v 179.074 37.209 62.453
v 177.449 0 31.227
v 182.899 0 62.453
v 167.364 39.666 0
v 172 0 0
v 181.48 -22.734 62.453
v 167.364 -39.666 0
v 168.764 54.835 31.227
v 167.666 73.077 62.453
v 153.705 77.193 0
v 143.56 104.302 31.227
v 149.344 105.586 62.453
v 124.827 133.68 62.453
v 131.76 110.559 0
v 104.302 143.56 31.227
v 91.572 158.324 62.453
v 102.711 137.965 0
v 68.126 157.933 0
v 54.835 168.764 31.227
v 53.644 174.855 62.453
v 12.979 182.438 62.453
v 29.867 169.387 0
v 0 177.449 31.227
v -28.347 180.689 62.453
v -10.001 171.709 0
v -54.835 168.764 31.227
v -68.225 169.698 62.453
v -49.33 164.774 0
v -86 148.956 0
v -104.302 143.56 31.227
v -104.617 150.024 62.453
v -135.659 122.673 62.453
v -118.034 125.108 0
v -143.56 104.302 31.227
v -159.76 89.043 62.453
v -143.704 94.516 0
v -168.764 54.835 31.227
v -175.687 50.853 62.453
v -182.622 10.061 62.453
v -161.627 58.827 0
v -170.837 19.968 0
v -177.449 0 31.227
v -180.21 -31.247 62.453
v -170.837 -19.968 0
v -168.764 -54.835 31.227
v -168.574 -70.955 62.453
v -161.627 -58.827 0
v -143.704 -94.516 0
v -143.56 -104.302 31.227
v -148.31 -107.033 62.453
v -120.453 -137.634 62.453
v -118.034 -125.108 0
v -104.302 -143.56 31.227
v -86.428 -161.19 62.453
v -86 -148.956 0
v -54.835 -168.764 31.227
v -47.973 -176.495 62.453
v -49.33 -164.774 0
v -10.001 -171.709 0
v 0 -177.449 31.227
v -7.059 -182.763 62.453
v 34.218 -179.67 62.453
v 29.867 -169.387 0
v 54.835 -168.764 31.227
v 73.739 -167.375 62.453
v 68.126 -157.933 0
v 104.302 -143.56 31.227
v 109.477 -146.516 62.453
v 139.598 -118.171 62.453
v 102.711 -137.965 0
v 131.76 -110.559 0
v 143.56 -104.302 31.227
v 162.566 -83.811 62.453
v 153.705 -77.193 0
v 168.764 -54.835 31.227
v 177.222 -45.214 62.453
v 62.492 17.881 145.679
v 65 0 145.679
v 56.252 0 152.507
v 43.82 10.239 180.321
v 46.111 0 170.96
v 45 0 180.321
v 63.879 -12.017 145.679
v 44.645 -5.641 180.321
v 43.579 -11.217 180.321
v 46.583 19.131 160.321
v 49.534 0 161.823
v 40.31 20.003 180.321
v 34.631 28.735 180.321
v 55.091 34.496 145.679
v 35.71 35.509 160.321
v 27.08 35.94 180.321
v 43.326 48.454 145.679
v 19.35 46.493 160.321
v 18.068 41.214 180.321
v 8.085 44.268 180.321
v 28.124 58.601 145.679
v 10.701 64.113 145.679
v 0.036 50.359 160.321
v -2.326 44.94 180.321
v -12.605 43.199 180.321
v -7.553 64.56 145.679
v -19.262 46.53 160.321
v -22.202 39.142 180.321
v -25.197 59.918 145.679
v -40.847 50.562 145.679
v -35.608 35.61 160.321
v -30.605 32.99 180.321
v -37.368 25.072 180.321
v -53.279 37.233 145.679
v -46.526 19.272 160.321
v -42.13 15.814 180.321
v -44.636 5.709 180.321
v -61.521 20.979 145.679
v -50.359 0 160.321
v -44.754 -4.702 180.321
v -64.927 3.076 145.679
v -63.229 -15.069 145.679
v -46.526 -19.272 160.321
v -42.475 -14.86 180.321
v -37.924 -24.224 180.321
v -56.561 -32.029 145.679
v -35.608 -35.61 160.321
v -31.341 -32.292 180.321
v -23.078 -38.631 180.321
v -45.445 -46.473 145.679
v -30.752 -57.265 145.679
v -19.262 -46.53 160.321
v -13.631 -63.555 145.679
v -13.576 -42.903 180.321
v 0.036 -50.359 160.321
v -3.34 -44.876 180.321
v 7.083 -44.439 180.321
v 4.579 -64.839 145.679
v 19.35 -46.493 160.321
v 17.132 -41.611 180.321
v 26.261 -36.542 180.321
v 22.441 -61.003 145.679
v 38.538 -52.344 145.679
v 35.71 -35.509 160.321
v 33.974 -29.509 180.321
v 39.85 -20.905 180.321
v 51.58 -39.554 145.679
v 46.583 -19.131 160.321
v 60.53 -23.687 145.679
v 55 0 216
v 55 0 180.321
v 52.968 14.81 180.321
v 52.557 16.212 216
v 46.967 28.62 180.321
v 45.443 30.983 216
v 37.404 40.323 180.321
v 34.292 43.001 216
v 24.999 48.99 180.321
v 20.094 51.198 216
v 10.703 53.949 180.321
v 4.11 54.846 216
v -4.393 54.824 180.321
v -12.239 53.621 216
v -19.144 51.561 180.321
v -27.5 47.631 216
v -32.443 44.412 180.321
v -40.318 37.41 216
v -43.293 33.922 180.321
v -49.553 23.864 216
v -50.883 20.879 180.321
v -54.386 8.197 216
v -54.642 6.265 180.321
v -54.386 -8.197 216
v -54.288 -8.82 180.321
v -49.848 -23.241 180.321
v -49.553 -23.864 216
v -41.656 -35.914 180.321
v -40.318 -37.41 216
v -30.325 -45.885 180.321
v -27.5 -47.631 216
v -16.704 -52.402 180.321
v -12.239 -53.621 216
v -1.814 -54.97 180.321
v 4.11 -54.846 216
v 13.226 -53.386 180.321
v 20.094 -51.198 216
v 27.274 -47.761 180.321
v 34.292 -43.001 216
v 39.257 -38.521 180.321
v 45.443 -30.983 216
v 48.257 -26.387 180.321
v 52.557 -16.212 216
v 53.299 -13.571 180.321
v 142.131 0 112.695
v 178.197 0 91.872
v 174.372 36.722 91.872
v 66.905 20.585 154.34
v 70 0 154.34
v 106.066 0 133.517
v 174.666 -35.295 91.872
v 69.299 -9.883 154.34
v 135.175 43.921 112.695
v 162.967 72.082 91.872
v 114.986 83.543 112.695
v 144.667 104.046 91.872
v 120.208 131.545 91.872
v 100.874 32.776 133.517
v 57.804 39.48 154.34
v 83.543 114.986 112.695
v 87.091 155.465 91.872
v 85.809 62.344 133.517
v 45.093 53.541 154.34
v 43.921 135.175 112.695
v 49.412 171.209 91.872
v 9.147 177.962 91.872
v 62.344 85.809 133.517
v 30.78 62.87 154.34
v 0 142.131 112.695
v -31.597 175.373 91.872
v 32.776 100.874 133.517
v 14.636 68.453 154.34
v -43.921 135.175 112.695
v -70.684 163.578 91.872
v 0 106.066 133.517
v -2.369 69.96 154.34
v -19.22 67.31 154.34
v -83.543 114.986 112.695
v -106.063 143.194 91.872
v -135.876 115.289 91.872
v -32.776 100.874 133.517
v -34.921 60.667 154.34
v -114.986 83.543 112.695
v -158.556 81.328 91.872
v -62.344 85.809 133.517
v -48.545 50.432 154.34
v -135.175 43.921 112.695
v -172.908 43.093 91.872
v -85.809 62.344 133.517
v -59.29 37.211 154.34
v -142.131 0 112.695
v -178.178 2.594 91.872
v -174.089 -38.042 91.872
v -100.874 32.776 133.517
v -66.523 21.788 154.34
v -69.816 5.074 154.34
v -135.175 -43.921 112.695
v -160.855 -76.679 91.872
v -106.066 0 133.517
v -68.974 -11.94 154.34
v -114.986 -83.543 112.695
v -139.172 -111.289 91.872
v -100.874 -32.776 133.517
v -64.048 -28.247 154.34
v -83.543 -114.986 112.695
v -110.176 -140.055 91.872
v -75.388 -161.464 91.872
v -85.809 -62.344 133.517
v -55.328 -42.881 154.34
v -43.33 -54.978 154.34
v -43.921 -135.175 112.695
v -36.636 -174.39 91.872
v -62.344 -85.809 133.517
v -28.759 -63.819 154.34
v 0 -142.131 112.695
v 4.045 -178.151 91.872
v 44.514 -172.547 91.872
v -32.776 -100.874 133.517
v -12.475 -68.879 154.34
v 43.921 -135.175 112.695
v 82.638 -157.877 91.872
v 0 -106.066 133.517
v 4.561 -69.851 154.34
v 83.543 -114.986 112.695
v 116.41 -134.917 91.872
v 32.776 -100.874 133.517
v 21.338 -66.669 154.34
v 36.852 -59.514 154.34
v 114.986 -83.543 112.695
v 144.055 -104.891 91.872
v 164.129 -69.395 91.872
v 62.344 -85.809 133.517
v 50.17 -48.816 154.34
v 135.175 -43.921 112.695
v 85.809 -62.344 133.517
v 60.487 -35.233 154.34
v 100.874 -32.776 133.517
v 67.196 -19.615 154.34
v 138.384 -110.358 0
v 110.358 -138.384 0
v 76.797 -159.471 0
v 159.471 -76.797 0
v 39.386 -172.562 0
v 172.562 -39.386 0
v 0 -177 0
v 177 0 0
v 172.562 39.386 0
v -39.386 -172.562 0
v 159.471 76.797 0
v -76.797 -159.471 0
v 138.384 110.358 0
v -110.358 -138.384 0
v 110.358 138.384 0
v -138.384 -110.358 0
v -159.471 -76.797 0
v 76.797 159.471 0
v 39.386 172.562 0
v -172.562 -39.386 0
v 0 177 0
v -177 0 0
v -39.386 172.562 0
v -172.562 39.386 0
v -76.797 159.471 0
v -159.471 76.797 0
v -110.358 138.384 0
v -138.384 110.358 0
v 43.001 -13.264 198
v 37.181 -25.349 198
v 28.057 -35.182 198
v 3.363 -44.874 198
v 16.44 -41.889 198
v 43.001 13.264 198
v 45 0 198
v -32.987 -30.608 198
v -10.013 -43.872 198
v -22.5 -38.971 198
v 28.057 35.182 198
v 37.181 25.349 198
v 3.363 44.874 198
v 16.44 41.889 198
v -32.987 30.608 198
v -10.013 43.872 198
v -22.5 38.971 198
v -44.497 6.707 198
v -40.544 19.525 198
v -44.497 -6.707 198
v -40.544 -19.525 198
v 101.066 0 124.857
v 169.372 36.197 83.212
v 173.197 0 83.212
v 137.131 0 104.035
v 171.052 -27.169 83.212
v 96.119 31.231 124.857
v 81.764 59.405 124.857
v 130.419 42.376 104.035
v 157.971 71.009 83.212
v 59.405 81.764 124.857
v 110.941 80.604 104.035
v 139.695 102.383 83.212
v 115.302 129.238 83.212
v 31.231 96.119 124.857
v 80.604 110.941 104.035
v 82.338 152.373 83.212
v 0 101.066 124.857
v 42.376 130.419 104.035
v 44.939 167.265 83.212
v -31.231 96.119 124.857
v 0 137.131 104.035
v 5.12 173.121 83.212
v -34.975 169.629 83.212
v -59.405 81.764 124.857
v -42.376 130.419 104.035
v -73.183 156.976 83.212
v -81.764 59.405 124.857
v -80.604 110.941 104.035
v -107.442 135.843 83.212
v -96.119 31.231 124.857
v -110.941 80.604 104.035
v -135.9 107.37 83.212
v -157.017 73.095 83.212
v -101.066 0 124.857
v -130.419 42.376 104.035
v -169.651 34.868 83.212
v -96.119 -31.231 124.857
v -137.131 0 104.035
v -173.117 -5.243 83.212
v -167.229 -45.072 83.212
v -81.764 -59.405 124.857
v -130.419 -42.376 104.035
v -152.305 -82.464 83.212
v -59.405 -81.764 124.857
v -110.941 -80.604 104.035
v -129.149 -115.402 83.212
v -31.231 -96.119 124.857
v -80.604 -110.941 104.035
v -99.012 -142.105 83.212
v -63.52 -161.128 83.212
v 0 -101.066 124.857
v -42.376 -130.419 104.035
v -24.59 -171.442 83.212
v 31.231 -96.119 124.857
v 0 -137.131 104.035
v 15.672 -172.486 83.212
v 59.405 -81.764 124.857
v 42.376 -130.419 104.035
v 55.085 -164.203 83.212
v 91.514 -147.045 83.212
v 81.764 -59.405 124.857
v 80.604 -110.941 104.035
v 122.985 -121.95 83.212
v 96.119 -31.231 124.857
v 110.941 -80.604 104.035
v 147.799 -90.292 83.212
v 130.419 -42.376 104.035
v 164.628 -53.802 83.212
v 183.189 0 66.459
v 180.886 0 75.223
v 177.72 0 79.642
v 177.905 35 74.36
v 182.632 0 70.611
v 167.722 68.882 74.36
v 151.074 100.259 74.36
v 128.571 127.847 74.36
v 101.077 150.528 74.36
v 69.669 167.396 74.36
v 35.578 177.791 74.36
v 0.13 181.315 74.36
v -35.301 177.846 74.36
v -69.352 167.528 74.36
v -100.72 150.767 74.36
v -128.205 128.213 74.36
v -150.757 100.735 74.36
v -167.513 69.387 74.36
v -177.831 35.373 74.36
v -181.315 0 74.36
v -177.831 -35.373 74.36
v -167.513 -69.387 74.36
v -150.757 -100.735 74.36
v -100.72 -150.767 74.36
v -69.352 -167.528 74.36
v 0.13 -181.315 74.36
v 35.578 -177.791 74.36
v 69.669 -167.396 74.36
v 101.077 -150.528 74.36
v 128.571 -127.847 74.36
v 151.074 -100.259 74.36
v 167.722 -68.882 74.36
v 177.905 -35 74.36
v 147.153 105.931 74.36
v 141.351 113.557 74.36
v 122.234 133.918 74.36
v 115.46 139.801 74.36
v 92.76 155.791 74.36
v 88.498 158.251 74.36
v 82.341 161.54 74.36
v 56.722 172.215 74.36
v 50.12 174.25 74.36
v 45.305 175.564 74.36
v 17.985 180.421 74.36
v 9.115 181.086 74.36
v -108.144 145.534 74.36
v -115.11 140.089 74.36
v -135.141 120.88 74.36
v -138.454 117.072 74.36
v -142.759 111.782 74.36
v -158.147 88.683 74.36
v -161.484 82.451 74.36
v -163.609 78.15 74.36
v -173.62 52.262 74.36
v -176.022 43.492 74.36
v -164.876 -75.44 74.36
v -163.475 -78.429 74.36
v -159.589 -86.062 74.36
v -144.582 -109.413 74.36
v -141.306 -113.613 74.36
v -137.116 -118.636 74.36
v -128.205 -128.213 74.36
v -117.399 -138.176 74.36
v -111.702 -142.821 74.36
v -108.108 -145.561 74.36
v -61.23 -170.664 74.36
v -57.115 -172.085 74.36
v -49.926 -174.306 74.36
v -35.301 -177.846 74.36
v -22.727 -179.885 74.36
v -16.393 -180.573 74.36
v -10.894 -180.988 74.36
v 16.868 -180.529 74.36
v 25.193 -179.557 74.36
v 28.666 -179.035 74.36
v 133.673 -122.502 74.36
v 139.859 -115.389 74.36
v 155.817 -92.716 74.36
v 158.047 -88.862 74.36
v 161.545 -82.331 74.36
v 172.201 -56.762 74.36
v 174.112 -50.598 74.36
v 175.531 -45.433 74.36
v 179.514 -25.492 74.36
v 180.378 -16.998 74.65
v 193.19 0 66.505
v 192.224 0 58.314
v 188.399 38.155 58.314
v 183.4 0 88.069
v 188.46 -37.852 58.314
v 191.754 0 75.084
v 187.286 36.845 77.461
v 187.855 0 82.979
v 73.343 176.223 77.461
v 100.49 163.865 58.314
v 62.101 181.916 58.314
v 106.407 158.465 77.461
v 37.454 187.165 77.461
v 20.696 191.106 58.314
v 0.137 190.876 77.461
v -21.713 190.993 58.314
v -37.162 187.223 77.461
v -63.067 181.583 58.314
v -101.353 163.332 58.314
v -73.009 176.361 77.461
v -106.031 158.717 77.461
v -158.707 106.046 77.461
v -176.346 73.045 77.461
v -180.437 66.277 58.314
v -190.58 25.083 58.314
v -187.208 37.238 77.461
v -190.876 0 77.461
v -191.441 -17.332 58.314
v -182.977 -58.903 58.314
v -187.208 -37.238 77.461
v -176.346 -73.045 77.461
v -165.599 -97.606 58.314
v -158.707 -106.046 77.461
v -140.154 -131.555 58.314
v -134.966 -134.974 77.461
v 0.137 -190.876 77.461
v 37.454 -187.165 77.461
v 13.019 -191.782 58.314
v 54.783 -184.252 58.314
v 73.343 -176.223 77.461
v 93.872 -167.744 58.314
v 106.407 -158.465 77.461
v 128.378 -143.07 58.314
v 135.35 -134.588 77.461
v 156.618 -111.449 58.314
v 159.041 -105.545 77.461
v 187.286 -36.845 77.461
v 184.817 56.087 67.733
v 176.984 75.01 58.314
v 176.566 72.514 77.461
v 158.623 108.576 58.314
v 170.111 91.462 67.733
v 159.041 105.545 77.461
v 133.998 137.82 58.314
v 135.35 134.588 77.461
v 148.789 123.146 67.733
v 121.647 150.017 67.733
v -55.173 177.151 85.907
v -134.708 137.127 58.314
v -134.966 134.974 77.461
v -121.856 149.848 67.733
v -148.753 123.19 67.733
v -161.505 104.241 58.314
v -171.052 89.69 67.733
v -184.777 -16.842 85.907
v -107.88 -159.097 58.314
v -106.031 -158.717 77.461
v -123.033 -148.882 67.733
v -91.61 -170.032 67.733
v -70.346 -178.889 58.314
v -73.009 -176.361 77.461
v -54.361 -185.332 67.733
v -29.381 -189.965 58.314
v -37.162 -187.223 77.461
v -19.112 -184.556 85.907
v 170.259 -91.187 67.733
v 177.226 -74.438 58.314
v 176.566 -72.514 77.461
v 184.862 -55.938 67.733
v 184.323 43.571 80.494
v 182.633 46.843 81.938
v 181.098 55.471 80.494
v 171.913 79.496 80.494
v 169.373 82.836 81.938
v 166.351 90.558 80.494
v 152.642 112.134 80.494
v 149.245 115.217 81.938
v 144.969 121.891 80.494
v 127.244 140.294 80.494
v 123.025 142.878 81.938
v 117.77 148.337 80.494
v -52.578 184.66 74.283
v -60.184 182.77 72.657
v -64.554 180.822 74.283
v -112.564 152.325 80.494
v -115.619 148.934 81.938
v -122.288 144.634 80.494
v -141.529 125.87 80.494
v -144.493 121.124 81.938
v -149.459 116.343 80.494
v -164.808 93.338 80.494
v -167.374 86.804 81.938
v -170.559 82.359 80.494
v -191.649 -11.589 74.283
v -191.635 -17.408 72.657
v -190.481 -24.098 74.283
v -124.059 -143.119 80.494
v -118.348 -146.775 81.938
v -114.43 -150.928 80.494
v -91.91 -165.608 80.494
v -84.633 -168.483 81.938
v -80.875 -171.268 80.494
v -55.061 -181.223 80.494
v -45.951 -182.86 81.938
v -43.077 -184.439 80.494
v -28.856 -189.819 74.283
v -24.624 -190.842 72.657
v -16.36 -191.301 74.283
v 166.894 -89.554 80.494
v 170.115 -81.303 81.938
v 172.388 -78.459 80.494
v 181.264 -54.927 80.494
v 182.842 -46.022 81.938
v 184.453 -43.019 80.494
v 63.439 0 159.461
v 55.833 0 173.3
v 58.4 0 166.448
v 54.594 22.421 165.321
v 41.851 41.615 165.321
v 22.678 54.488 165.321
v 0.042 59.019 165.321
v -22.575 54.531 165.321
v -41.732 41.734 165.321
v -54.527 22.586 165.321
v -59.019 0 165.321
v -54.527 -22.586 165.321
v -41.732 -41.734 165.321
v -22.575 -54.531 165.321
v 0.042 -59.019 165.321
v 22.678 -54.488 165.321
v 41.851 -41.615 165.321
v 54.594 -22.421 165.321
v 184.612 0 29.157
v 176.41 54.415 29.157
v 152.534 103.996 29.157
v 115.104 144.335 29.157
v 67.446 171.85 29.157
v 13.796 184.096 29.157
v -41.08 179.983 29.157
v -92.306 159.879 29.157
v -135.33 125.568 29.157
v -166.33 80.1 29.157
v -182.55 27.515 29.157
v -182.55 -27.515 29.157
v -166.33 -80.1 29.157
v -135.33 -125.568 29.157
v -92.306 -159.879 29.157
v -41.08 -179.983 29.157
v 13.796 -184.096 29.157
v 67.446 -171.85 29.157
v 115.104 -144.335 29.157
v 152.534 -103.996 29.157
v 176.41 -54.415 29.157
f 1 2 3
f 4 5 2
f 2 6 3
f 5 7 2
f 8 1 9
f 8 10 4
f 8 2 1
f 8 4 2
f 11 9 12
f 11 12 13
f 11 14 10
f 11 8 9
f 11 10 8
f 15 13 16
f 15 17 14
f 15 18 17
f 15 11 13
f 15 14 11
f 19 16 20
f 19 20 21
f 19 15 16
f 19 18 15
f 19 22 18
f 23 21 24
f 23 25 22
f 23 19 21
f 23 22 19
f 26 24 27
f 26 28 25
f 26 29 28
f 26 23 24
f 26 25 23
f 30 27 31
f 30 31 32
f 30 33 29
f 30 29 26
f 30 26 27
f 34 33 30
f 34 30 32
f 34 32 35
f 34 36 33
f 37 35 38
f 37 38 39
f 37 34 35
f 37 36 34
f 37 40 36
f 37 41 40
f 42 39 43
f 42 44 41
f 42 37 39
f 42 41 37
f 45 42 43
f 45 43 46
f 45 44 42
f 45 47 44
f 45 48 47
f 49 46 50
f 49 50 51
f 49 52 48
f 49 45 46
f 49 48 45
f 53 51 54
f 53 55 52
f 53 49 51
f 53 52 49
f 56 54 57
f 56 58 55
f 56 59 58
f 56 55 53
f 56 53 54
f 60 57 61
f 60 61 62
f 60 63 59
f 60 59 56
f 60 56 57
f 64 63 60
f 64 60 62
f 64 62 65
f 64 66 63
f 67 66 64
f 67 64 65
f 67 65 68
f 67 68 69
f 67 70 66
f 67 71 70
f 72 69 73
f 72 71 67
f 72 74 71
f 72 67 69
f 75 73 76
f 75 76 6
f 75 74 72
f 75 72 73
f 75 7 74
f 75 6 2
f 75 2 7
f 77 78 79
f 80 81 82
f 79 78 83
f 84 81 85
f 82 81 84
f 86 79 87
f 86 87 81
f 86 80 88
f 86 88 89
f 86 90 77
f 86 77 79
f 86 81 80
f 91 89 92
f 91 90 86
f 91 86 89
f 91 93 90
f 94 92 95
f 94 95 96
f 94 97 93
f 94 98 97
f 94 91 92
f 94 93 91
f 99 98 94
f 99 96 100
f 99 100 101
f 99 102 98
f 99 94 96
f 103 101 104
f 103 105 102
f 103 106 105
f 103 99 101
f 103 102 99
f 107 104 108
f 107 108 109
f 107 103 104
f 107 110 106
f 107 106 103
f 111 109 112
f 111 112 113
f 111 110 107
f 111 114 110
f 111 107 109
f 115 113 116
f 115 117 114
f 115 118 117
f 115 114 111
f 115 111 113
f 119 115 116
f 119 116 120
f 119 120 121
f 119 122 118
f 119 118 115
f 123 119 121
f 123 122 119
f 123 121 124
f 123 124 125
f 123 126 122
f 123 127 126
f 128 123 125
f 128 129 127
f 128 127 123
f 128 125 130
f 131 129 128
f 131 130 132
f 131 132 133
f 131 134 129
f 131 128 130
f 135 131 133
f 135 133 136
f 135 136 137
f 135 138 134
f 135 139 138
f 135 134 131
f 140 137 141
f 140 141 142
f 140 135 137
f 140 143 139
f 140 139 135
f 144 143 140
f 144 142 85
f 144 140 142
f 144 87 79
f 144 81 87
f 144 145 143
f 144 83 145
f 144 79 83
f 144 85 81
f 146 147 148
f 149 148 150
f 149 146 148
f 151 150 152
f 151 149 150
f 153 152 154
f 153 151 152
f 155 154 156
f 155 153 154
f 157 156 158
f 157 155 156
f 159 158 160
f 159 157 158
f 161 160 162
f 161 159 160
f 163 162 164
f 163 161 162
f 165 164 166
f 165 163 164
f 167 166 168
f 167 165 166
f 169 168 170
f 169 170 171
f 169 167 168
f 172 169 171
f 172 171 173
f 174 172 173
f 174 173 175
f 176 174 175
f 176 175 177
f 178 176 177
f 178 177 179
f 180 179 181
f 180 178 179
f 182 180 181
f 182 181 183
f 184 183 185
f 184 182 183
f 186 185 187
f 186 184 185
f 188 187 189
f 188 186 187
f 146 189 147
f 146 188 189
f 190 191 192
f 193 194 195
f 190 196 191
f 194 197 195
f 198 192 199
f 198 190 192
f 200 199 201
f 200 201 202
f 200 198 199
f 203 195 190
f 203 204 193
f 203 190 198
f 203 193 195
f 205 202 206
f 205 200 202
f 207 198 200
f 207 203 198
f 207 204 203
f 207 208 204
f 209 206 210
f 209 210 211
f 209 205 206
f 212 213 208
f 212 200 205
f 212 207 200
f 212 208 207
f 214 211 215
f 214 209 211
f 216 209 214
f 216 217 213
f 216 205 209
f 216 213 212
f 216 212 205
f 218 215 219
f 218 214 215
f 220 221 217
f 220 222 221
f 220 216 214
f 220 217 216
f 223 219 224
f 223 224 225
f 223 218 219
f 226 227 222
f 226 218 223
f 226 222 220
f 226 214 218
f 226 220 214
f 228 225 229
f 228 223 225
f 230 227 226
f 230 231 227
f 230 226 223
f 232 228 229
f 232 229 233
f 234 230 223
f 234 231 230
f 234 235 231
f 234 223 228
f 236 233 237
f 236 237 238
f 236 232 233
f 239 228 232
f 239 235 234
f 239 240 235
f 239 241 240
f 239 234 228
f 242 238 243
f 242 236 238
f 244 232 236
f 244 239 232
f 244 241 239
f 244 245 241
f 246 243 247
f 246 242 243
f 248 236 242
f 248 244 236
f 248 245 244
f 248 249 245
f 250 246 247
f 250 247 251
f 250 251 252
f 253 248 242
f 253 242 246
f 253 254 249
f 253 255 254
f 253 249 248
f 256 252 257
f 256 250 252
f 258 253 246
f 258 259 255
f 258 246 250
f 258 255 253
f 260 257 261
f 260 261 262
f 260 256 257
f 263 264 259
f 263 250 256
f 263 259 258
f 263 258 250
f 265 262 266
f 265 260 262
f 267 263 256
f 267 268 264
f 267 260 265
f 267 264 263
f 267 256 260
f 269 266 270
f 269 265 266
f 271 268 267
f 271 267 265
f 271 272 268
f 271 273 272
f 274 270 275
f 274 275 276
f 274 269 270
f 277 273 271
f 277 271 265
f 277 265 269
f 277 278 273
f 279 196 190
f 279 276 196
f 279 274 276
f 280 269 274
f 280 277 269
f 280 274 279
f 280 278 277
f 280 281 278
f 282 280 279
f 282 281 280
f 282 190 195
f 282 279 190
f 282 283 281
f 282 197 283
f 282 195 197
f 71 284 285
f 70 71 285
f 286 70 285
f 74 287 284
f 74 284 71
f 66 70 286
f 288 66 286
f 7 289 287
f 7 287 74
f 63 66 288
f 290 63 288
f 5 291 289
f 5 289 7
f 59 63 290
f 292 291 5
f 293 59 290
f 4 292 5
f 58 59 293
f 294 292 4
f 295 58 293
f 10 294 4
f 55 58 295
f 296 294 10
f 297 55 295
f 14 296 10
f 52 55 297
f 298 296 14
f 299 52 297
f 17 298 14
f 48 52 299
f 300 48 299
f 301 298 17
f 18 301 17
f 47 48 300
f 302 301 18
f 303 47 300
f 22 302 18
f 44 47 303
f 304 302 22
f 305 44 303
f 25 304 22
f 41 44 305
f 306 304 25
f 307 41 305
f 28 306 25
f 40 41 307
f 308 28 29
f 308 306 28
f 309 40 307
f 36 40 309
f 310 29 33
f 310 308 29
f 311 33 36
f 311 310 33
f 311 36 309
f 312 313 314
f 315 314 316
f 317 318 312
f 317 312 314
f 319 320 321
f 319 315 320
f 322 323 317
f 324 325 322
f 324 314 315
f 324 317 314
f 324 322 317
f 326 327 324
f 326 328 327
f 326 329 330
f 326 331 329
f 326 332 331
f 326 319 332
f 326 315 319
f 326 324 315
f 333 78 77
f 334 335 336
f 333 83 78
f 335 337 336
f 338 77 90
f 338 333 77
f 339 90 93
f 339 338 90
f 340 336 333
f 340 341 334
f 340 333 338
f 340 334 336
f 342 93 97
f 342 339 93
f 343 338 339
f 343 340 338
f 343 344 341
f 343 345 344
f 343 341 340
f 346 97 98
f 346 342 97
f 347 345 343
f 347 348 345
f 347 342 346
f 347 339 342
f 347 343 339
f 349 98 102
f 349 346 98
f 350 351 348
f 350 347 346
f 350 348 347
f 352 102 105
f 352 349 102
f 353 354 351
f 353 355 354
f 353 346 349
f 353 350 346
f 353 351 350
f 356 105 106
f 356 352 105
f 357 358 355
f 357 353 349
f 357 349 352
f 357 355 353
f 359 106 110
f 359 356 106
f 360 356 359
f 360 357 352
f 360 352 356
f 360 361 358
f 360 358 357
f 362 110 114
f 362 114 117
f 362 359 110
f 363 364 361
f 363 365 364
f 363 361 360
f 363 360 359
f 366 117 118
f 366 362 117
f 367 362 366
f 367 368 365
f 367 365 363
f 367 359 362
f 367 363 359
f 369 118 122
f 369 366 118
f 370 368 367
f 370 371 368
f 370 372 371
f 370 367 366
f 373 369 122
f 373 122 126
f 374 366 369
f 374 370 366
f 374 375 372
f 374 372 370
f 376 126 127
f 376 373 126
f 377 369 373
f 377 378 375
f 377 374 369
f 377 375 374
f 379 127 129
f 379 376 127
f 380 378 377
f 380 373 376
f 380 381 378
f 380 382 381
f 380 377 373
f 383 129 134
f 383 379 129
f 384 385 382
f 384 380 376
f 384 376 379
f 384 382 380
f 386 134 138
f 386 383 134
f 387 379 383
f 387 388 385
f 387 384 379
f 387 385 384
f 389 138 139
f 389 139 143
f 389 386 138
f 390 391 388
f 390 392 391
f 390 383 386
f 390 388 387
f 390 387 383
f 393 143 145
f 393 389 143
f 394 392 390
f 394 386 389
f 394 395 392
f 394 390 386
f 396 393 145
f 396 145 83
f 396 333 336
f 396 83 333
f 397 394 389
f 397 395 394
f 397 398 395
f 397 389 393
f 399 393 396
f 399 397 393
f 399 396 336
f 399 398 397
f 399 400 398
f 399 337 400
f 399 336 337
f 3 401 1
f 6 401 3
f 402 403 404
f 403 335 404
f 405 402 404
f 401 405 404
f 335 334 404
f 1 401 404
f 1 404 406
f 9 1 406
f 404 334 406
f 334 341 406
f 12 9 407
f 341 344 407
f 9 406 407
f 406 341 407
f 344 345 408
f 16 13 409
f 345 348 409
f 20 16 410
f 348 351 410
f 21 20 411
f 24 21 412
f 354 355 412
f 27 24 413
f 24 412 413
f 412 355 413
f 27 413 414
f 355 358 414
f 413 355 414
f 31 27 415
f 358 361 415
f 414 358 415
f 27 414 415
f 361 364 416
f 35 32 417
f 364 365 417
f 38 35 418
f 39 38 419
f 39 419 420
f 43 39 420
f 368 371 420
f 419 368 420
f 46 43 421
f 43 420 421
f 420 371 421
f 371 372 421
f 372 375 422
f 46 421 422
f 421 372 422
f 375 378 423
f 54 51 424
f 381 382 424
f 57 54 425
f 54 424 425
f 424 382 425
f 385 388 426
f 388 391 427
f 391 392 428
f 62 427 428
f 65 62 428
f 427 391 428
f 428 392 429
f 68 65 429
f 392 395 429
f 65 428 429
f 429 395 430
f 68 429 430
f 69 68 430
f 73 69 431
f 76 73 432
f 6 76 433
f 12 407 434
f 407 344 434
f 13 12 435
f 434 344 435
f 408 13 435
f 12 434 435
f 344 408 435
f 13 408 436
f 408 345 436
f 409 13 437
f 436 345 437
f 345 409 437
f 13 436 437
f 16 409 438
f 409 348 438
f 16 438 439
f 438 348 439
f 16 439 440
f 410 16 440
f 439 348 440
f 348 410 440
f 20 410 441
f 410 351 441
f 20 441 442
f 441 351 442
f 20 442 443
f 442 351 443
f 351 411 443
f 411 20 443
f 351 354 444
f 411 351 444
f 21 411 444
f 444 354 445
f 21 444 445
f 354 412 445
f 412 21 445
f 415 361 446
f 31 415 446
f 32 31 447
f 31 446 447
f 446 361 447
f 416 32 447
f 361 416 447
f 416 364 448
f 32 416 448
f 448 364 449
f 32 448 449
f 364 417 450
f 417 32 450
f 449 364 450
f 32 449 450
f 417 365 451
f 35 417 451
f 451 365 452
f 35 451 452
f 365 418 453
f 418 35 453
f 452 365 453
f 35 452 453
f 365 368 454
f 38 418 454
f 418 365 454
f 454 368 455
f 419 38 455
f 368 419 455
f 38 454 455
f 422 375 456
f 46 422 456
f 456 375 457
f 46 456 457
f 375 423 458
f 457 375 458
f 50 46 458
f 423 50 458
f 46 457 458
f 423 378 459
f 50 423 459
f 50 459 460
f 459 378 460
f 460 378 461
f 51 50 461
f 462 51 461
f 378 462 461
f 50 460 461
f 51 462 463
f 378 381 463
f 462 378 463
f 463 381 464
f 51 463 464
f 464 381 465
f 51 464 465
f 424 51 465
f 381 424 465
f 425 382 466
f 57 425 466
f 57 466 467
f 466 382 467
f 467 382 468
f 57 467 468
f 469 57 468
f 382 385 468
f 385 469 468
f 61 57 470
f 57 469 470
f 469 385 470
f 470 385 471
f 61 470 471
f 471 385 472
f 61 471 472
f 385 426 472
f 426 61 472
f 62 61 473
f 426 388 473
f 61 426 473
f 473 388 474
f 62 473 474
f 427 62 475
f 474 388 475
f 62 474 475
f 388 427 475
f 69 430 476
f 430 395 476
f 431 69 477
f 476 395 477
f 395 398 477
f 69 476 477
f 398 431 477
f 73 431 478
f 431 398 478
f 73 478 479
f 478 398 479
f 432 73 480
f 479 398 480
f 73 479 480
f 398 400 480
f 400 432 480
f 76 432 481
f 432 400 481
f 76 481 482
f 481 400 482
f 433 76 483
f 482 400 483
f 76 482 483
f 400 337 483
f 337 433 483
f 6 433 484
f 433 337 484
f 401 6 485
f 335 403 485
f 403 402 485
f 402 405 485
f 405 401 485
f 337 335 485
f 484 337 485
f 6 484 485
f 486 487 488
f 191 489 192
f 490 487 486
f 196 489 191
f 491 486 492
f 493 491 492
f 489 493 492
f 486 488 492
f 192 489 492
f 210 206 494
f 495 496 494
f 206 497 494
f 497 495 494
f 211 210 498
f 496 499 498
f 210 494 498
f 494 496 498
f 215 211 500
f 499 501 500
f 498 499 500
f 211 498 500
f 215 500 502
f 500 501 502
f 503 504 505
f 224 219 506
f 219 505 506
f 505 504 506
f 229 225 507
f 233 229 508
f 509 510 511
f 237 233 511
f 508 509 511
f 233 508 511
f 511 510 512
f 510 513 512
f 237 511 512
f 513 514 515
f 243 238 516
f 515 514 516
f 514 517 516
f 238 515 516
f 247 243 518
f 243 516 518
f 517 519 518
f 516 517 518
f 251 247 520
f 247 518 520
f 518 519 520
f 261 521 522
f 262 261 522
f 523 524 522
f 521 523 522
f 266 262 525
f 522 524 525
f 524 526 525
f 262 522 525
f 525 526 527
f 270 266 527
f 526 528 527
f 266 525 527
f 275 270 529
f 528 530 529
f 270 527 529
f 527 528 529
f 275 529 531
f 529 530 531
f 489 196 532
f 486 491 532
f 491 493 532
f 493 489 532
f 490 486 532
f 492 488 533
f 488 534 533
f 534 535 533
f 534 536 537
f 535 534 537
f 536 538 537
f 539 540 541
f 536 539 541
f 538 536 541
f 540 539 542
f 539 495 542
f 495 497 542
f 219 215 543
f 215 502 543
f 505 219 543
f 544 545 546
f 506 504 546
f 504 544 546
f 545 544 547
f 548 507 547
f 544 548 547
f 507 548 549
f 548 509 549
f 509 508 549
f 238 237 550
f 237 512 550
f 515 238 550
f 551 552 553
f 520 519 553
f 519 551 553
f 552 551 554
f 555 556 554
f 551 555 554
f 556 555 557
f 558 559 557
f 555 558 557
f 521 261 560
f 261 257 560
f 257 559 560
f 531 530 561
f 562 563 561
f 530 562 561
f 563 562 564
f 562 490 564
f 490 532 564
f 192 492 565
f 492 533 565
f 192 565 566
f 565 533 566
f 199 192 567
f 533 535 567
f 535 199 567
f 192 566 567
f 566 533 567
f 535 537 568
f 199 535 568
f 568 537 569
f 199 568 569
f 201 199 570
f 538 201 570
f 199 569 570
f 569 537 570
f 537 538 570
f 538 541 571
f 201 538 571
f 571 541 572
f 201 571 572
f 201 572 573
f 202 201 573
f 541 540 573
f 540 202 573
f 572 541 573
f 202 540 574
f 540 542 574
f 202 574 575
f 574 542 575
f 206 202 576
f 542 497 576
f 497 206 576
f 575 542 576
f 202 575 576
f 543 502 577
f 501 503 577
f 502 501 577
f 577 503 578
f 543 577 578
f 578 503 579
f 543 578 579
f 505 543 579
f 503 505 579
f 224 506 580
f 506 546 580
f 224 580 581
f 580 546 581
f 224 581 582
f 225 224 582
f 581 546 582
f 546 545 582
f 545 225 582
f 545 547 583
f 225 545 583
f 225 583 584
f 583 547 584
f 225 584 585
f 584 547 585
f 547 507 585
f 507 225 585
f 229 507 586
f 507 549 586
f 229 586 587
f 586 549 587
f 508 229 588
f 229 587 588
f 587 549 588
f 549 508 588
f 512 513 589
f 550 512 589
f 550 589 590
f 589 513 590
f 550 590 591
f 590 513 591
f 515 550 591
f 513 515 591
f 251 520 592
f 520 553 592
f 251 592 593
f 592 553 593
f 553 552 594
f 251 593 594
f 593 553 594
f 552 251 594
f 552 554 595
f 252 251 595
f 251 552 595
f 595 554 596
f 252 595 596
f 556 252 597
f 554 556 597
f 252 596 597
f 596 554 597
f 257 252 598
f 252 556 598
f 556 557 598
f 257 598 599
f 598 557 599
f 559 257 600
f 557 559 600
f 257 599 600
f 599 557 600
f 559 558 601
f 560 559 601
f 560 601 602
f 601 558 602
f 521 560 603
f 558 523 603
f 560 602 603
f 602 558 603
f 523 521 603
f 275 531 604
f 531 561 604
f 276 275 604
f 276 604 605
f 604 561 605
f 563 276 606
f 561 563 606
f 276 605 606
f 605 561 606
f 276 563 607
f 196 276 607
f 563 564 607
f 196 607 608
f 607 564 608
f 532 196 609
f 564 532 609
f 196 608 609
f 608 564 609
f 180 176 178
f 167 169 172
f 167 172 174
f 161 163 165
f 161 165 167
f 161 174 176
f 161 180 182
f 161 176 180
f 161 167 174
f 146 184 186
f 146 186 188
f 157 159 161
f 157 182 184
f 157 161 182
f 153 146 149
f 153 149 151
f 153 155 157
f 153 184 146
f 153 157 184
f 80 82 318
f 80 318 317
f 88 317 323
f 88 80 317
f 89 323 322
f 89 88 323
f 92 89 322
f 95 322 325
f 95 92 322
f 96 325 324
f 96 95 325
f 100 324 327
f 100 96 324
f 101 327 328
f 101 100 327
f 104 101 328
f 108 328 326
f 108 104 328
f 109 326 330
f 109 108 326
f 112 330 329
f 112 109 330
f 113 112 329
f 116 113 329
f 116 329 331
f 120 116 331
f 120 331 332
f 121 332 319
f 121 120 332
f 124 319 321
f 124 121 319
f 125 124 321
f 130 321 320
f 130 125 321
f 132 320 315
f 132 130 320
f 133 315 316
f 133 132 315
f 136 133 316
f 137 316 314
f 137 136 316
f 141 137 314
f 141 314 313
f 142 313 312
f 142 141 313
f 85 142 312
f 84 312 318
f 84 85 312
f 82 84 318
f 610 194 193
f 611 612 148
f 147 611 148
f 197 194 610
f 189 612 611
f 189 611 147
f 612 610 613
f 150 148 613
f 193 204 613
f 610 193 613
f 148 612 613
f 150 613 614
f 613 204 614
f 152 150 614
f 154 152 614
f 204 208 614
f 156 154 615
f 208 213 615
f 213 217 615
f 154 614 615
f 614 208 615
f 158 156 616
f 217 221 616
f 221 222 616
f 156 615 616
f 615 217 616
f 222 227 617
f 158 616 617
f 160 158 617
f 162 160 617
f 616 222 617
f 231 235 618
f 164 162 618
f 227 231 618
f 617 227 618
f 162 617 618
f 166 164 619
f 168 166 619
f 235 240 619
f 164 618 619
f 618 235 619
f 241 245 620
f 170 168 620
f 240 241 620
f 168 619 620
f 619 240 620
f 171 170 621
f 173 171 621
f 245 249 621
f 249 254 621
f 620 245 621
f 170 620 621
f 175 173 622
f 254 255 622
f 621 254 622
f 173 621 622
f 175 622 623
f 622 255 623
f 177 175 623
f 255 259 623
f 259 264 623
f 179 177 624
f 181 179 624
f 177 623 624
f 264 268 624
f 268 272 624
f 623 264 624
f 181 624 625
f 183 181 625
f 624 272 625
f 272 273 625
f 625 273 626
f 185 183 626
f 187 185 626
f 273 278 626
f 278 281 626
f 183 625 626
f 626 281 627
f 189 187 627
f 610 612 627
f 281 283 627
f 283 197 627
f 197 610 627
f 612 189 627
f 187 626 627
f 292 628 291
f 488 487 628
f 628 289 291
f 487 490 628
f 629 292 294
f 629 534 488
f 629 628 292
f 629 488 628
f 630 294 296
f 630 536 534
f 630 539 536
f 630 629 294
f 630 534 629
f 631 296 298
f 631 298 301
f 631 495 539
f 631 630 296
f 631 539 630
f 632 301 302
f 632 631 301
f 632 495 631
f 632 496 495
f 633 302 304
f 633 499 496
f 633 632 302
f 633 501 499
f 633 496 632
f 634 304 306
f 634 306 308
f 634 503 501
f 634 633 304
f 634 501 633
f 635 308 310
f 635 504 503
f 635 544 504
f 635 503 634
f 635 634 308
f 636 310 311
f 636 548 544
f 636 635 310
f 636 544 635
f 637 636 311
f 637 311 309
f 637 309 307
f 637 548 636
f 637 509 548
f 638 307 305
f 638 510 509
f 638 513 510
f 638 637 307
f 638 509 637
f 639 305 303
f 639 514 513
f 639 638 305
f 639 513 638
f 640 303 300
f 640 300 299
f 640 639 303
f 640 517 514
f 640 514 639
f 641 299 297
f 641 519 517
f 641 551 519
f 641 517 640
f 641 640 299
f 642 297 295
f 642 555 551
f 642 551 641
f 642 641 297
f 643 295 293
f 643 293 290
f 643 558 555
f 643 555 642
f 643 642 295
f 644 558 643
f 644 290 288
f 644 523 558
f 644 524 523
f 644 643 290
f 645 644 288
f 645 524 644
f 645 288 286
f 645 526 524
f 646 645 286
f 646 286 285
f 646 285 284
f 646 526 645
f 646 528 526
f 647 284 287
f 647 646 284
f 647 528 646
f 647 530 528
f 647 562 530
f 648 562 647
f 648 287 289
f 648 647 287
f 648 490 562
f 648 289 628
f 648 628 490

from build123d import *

# Parameters (mm, degrees)
F2_R = 20
F3_R = 30
F4_R = 40


with BuildPart() as f1:
    # F0 (on Front) → F1 (revolve)
    with BuildSketch(Plane.XZ):
        Polygon((0, 216), (0, 198), (45, 198), (45, 157.226497), (185.301924, 76.223143), (172, 0), (177, 0), (198, 80.438912), (55, 163), (55, 216), align=None)
    revolve(axis=Axis((0, 0, 99), (0, 0, 1)))

    # F2
    f2_edges = [f1.edges().sort_by_distance(p)[0] for p in [
        (-185.301924, 0, 76.223143),
    ]]
    fillet(f2_edges, radius=F2_R)

    # F3
    f3_edges = [f1.edges().sort_by_distance(p)[0] for p in [
        (-198, 0, 80.438912),
        (-55, 0, 163),
    ]]
    fillet(f3_edges, radius=F3_R)

    # F4
    f4_edges = [f1.edges().sort_by_distance(p)[0] for p in [
        (-45, 0, 157.226497),
    ]]
    fillet(f4_edges, radius=F4_R)


solid = f1.part
